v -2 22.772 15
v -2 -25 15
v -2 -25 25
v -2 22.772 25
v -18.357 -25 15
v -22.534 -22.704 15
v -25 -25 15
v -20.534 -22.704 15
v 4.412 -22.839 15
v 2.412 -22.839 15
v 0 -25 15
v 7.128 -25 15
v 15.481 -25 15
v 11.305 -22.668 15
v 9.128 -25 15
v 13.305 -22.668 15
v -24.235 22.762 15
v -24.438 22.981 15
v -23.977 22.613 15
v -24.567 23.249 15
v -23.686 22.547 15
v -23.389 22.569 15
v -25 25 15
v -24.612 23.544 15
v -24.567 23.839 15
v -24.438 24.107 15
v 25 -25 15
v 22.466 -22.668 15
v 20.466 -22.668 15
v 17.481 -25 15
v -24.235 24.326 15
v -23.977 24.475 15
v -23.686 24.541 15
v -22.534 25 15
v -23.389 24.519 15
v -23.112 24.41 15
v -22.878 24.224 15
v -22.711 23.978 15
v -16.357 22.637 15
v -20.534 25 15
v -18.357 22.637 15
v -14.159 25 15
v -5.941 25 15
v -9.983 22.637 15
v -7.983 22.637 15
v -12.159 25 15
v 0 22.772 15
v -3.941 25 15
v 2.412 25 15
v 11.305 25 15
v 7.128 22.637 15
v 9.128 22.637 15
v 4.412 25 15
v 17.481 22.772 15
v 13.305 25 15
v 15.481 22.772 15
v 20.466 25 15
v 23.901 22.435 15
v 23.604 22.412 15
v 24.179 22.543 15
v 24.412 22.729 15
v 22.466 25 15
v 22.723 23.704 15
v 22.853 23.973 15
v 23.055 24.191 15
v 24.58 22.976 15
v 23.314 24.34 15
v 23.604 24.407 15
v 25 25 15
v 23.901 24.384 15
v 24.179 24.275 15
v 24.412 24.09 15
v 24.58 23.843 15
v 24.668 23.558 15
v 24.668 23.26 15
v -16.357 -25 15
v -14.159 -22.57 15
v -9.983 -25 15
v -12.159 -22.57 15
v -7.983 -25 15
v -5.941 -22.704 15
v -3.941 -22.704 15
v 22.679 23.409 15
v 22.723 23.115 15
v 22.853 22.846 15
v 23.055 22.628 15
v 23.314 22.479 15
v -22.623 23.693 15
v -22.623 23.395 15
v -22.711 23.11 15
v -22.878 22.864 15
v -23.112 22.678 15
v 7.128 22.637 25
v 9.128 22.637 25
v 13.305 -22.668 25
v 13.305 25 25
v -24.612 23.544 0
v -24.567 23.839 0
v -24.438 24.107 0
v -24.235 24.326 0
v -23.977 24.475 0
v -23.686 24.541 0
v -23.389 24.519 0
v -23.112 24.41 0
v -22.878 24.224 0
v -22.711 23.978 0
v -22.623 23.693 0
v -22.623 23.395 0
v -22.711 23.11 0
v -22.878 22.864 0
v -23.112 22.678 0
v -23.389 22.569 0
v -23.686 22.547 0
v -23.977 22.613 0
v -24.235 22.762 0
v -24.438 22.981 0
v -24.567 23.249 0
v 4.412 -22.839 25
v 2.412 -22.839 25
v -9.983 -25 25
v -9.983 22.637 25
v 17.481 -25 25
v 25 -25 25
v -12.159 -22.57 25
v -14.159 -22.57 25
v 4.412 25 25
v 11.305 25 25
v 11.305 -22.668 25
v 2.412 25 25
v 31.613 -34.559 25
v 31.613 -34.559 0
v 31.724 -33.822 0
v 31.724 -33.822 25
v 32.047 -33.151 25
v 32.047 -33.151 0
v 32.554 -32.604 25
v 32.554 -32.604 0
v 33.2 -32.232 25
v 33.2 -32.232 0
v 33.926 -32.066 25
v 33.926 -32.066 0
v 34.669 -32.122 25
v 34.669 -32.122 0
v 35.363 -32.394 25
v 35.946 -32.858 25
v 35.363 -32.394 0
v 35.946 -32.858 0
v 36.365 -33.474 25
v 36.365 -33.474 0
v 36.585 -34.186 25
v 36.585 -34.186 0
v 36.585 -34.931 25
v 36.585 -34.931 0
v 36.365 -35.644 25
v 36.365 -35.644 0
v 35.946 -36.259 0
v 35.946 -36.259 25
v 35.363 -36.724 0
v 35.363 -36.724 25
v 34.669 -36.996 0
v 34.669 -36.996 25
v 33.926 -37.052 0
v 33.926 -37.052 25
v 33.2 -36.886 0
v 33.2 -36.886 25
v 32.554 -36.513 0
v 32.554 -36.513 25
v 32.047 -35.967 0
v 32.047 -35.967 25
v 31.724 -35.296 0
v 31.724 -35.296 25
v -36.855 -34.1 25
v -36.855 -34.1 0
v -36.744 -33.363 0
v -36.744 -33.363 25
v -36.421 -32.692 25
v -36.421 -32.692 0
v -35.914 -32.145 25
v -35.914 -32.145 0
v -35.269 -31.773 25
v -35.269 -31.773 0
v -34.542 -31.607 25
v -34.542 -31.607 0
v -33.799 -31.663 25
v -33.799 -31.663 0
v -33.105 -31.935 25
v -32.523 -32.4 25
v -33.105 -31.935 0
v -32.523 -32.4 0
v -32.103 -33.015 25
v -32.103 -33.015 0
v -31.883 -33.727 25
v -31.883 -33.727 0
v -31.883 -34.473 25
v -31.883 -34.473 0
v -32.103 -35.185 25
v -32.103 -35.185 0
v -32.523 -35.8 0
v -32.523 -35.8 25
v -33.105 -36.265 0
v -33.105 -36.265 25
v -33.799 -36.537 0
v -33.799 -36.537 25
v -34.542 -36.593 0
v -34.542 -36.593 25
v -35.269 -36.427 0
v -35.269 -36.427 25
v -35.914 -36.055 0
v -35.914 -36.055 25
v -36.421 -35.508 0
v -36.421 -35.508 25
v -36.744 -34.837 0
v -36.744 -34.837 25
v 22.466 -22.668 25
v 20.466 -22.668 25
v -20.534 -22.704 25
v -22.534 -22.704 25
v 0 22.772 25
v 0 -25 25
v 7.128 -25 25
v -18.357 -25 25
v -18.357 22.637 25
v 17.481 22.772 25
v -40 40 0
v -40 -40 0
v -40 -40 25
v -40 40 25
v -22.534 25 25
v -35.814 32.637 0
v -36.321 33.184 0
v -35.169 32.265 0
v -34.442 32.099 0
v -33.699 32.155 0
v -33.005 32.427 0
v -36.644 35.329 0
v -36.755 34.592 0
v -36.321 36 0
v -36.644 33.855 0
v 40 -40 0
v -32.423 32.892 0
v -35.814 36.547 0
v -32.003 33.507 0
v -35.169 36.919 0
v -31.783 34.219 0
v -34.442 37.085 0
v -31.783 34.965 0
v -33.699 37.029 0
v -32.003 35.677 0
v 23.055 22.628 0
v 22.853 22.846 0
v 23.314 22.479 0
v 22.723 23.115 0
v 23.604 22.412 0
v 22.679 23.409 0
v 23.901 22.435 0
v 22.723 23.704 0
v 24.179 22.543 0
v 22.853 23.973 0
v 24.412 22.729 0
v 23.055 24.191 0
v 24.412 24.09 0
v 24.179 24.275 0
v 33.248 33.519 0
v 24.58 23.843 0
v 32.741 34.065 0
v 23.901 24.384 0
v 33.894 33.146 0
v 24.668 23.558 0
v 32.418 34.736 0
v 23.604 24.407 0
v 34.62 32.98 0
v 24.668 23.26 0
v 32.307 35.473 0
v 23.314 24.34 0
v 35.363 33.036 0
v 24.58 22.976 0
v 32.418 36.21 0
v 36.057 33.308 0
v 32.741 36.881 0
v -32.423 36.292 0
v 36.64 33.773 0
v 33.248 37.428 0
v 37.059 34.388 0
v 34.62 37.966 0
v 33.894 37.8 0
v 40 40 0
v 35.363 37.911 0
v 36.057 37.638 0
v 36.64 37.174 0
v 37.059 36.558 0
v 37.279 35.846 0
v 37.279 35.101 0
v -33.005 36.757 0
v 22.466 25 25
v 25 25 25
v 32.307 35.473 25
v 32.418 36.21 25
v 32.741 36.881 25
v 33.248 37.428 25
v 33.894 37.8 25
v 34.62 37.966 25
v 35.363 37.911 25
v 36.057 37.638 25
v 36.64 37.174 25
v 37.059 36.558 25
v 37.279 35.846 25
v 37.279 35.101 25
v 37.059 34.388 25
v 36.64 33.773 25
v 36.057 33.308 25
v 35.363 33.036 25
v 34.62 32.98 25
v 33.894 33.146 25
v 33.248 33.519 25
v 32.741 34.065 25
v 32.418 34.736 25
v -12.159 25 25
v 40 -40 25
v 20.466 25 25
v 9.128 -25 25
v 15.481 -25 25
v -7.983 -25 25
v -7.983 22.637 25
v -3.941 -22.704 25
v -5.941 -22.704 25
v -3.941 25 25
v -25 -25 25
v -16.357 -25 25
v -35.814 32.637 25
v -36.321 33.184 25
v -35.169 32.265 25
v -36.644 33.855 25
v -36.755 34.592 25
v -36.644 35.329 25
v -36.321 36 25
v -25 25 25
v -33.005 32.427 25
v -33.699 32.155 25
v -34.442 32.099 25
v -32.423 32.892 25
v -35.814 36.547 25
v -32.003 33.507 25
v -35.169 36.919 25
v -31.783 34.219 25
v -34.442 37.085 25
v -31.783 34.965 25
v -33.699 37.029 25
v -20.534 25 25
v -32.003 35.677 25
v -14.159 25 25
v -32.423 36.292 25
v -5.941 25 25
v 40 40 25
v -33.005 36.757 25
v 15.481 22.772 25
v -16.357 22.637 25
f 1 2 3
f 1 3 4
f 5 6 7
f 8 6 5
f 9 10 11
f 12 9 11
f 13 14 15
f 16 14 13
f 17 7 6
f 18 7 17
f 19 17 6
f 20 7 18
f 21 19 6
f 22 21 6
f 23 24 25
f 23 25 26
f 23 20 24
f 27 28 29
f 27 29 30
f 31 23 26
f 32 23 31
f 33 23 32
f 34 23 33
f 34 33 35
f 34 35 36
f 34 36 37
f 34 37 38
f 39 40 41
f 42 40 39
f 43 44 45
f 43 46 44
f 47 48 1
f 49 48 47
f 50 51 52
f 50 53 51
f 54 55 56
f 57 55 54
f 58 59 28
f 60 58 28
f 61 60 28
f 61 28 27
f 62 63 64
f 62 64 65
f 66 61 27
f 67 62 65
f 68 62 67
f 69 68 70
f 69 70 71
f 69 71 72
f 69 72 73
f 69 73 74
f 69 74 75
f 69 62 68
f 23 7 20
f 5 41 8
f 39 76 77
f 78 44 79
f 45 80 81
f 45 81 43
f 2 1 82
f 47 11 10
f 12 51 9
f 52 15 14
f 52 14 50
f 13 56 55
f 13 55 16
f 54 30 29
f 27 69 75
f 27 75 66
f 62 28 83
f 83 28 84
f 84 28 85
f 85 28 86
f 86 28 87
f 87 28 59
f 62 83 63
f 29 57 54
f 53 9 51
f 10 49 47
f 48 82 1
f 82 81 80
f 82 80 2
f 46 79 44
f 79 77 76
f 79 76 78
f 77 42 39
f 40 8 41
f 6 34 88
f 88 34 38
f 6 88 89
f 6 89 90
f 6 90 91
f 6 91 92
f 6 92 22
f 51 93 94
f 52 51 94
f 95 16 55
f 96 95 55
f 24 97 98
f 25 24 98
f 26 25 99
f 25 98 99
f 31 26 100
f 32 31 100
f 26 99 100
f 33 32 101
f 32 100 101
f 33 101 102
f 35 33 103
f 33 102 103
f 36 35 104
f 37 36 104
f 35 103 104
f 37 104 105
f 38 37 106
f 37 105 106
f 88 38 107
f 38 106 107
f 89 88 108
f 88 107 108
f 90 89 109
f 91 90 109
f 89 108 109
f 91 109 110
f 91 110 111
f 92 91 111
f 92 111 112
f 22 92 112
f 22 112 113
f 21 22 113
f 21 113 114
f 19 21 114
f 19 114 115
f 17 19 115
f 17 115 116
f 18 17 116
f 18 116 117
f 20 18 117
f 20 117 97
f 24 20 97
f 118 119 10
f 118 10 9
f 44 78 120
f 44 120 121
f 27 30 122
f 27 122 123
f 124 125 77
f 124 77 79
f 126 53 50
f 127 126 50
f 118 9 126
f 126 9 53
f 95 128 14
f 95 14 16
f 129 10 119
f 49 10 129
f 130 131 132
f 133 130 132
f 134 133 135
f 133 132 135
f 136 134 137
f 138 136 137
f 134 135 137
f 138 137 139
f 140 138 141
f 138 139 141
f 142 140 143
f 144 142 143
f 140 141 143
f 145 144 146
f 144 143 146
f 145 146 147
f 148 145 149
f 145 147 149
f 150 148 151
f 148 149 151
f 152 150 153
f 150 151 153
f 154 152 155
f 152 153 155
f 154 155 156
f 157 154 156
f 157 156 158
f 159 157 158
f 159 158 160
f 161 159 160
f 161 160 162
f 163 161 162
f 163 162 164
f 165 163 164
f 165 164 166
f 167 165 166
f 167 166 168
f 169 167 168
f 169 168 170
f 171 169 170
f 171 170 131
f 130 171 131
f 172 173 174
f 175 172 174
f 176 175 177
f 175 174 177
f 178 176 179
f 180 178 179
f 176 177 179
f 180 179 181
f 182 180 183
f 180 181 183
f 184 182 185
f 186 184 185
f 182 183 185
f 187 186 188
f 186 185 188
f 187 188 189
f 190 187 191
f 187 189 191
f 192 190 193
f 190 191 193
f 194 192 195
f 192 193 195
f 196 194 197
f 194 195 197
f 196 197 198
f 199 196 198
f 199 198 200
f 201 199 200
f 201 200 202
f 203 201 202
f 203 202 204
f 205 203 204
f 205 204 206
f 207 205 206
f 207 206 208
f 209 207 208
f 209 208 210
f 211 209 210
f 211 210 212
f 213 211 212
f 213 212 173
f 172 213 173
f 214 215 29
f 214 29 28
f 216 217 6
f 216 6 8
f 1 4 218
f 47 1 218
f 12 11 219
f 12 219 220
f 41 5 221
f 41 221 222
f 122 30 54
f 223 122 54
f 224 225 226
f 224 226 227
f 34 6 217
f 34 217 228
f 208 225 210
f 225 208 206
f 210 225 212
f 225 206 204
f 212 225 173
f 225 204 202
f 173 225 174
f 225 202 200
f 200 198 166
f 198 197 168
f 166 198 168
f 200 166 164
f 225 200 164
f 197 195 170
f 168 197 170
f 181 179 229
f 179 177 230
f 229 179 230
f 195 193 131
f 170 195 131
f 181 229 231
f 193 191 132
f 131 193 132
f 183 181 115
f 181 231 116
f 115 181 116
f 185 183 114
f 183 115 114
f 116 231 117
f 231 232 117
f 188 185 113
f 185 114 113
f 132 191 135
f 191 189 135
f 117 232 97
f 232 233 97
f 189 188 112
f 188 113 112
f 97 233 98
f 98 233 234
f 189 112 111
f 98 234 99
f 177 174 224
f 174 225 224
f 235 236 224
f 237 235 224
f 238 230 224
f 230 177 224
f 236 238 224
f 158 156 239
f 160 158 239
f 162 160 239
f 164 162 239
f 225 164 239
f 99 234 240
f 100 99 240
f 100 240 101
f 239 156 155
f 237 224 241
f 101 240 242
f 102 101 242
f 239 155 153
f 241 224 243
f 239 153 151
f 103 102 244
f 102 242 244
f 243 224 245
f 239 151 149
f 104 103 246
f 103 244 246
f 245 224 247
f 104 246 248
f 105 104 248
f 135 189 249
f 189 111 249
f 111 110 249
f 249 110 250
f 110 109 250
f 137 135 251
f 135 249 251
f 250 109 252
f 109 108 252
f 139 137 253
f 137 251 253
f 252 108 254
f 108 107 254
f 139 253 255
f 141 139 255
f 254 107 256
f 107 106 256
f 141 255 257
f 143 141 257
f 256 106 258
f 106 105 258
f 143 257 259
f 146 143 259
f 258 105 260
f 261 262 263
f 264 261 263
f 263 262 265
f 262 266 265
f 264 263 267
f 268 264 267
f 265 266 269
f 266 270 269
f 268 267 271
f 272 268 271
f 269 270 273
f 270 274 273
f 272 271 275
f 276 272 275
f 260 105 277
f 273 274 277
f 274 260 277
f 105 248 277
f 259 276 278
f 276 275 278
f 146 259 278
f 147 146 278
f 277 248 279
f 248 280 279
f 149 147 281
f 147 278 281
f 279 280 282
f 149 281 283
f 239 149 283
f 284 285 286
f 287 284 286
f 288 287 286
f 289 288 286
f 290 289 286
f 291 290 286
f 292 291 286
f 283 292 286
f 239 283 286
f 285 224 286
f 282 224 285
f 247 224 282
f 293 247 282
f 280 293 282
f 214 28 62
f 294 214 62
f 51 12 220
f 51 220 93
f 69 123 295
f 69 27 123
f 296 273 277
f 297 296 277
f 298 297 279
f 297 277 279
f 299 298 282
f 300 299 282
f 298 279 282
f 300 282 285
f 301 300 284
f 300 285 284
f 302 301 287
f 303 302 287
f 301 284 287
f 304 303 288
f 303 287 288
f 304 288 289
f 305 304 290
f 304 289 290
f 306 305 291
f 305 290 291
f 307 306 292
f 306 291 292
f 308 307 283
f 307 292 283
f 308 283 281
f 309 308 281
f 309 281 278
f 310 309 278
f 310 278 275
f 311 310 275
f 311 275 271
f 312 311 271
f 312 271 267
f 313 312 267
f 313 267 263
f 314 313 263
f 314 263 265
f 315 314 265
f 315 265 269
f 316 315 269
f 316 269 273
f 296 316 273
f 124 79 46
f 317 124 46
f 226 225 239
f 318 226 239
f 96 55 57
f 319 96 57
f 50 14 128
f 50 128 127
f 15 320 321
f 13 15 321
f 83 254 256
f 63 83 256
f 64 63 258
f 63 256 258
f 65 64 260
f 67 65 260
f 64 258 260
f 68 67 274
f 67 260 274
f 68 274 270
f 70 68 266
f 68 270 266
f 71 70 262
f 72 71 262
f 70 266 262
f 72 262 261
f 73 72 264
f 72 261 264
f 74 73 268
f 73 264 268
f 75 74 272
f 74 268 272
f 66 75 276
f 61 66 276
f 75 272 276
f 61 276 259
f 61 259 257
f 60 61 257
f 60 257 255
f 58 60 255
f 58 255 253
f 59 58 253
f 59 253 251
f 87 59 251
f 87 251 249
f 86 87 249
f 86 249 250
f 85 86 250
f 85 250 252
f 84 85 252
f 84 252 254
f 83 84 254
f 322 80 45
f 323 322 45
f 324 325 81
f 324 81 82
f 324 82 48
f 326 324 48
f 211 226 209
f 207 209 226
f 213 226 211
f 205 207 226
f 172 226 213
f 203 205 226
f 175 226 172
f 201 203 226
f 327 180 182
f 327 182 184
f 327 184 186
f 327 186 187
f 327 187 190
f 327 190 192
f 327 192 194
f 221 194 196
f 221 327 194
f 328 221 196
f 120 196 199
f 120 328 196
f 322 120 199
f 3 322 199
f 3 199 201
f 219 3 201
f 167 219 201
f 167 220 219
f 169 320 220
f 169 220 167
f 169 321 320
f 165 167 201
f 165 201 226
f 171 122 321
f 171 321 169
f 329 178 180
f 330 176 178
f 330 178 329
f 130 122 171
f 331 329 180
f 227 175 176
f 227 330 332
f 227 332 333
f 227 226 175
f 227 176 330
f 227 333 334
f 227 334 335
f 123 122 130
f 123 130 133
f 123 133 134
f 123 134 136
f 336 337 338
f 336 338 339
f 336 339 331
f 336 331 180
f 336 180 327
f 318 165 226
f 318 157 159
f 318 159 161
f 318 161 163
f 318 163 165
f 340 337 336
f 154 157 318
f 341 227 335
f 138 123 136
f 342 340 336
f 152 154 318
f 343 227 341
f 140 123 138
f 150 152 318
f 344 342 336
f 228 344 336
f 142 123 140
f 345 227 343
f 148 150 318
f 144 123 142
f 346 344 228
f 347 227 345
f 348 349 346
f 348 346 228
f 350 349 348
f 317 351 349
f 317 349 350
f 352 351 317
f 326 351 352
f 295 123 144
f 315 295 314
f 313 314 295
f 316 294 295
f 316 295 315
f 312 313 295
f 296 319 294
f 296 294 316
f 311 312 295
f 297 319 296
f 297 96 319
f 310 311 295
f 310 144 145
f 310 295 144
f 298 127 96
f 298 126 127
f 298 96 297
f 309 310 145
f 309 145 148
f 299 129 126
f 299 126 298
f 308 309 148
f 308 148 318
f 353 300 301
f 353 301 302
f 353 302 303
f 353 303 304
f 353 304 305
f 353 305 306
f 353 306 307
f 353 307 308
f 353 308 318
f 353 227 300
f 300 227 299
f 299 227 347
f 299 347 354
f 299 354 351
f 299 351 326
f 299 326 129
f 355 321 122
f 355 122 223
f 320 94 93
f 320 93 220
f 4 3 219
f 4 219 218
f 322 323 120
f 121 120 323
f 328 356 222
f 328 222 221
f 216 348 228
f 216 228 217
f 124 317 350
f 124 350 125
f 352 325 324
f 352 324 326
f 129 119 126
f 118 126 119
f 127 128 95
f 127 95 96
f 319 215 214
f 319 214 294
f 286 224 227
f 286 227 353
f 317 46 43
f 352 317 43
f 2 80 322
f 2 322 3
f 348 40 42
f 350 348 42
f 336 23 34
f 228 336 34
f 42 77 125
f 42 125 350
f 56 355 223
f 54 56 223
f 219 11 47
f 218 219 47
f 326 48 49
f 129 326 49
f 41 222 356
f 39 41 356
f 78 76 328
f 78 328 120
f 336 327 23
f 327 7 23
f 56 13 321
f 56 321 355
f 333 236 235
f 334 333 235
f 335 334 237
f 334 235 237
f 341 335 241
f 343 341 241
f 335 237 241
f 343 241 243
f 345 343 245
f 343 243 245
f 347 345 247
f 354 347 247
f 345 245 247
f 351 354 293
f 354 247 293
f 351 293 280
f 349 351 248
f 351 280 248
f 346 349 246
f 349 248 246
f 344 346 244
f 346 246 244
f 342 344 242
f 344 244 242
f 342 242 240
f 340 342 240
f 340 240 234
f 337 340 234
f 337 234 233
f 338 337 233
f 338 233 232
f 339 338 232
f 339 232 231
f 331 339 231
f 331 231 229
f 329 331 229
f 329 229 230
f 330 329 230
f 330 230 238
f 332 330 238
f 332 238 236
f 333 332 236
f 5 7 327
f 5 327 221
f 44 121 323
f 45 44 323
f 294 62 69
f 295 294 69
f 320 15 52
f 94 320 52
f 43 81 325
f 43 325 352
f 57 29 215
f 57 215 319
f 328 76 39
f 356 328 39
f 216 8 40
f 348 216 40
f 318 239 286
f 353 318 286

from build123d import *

# Parameters (mm, degrees)
F0_W     = 80
F0_H     = 80
F3_DEPTH = 25
F4_T     = -15
F1_W     = 2
F1_H     = 48
F2_W     = 2
F2_H     = 48
F6_DEPTH = 25
F7_D     = 2
F9_D     = 5


with BuildPart() as f3:
    # F0 (on Top) → F3 (new body)
    with BuildSketch(Plane.XY):
        Rectangle(F0_W, F0_H)
    extrude(amount=F3_DEPTH)

    # F4
    f4_openings = [f3.faces().sort_by_distance(p)[0] for p in [
        (0, 0, 25),
    ]]
    offset(amount=F4_T, openings=f4_openings)

    # F1 (on face) + F2 (on face) → F6 (join)
    with BuildSketch(Plane.XY):
        with Locations((-21.533683, 1.29566)):
            Rectangle(F1_W, F1_H)
    with BuildSketch(Plane.XY):
        with Locations((-17.357037, -1.363026)):
            Rectangle(F2_W, F2_H)
        with Locations((-13.159431, 1.430389)):
            Rectangle(F2_W, F2_H)
        with Locations((-8.982785, -1.363026)):
            Rectangle(F2_W, F2_H)
        with Locations((-4.940869, 1.29566)):
            Rectangle(F2_W, F2_H)
        with Locations((-1, -1.228295)):
            Rectangle(F2_W, F2_H)
        with Locations((3.412425, 1.160929)):
            Rectangle(F2_W, F2_H)
        with Locations((8.127995, -1.363026)):
            Rectangle(F2_W, F2_H)
        with Locations((12.304641, 1.331586)):
            Rectangle(F2_W, F2_H)
        with Locations((16.481286, -1.228295)):
            Rectangle(F2_W, F2_H)
        with Locations((21.466319, 1.331586)):
            Rectangle(F2_W, F2_H)
    extrude(amount=F6_DEPTH)

    # F7 (through all)
    with Locations(Plane.XY.offset(15)):
        with Locations((-23.611529, 23.544163), (23.678893, 23.409432)):
            Hole(F7_D / 2)

    # F9 (through all)
    with Locations(Plane.XY.offset(25)):
        with Locations((-34.25524, 34.592066), (34.8069, 35.473198), (34.113035, -34.558825), (-34.355238, -34.1)):
            Hole(F9_D / 2)


solid = f3.part
